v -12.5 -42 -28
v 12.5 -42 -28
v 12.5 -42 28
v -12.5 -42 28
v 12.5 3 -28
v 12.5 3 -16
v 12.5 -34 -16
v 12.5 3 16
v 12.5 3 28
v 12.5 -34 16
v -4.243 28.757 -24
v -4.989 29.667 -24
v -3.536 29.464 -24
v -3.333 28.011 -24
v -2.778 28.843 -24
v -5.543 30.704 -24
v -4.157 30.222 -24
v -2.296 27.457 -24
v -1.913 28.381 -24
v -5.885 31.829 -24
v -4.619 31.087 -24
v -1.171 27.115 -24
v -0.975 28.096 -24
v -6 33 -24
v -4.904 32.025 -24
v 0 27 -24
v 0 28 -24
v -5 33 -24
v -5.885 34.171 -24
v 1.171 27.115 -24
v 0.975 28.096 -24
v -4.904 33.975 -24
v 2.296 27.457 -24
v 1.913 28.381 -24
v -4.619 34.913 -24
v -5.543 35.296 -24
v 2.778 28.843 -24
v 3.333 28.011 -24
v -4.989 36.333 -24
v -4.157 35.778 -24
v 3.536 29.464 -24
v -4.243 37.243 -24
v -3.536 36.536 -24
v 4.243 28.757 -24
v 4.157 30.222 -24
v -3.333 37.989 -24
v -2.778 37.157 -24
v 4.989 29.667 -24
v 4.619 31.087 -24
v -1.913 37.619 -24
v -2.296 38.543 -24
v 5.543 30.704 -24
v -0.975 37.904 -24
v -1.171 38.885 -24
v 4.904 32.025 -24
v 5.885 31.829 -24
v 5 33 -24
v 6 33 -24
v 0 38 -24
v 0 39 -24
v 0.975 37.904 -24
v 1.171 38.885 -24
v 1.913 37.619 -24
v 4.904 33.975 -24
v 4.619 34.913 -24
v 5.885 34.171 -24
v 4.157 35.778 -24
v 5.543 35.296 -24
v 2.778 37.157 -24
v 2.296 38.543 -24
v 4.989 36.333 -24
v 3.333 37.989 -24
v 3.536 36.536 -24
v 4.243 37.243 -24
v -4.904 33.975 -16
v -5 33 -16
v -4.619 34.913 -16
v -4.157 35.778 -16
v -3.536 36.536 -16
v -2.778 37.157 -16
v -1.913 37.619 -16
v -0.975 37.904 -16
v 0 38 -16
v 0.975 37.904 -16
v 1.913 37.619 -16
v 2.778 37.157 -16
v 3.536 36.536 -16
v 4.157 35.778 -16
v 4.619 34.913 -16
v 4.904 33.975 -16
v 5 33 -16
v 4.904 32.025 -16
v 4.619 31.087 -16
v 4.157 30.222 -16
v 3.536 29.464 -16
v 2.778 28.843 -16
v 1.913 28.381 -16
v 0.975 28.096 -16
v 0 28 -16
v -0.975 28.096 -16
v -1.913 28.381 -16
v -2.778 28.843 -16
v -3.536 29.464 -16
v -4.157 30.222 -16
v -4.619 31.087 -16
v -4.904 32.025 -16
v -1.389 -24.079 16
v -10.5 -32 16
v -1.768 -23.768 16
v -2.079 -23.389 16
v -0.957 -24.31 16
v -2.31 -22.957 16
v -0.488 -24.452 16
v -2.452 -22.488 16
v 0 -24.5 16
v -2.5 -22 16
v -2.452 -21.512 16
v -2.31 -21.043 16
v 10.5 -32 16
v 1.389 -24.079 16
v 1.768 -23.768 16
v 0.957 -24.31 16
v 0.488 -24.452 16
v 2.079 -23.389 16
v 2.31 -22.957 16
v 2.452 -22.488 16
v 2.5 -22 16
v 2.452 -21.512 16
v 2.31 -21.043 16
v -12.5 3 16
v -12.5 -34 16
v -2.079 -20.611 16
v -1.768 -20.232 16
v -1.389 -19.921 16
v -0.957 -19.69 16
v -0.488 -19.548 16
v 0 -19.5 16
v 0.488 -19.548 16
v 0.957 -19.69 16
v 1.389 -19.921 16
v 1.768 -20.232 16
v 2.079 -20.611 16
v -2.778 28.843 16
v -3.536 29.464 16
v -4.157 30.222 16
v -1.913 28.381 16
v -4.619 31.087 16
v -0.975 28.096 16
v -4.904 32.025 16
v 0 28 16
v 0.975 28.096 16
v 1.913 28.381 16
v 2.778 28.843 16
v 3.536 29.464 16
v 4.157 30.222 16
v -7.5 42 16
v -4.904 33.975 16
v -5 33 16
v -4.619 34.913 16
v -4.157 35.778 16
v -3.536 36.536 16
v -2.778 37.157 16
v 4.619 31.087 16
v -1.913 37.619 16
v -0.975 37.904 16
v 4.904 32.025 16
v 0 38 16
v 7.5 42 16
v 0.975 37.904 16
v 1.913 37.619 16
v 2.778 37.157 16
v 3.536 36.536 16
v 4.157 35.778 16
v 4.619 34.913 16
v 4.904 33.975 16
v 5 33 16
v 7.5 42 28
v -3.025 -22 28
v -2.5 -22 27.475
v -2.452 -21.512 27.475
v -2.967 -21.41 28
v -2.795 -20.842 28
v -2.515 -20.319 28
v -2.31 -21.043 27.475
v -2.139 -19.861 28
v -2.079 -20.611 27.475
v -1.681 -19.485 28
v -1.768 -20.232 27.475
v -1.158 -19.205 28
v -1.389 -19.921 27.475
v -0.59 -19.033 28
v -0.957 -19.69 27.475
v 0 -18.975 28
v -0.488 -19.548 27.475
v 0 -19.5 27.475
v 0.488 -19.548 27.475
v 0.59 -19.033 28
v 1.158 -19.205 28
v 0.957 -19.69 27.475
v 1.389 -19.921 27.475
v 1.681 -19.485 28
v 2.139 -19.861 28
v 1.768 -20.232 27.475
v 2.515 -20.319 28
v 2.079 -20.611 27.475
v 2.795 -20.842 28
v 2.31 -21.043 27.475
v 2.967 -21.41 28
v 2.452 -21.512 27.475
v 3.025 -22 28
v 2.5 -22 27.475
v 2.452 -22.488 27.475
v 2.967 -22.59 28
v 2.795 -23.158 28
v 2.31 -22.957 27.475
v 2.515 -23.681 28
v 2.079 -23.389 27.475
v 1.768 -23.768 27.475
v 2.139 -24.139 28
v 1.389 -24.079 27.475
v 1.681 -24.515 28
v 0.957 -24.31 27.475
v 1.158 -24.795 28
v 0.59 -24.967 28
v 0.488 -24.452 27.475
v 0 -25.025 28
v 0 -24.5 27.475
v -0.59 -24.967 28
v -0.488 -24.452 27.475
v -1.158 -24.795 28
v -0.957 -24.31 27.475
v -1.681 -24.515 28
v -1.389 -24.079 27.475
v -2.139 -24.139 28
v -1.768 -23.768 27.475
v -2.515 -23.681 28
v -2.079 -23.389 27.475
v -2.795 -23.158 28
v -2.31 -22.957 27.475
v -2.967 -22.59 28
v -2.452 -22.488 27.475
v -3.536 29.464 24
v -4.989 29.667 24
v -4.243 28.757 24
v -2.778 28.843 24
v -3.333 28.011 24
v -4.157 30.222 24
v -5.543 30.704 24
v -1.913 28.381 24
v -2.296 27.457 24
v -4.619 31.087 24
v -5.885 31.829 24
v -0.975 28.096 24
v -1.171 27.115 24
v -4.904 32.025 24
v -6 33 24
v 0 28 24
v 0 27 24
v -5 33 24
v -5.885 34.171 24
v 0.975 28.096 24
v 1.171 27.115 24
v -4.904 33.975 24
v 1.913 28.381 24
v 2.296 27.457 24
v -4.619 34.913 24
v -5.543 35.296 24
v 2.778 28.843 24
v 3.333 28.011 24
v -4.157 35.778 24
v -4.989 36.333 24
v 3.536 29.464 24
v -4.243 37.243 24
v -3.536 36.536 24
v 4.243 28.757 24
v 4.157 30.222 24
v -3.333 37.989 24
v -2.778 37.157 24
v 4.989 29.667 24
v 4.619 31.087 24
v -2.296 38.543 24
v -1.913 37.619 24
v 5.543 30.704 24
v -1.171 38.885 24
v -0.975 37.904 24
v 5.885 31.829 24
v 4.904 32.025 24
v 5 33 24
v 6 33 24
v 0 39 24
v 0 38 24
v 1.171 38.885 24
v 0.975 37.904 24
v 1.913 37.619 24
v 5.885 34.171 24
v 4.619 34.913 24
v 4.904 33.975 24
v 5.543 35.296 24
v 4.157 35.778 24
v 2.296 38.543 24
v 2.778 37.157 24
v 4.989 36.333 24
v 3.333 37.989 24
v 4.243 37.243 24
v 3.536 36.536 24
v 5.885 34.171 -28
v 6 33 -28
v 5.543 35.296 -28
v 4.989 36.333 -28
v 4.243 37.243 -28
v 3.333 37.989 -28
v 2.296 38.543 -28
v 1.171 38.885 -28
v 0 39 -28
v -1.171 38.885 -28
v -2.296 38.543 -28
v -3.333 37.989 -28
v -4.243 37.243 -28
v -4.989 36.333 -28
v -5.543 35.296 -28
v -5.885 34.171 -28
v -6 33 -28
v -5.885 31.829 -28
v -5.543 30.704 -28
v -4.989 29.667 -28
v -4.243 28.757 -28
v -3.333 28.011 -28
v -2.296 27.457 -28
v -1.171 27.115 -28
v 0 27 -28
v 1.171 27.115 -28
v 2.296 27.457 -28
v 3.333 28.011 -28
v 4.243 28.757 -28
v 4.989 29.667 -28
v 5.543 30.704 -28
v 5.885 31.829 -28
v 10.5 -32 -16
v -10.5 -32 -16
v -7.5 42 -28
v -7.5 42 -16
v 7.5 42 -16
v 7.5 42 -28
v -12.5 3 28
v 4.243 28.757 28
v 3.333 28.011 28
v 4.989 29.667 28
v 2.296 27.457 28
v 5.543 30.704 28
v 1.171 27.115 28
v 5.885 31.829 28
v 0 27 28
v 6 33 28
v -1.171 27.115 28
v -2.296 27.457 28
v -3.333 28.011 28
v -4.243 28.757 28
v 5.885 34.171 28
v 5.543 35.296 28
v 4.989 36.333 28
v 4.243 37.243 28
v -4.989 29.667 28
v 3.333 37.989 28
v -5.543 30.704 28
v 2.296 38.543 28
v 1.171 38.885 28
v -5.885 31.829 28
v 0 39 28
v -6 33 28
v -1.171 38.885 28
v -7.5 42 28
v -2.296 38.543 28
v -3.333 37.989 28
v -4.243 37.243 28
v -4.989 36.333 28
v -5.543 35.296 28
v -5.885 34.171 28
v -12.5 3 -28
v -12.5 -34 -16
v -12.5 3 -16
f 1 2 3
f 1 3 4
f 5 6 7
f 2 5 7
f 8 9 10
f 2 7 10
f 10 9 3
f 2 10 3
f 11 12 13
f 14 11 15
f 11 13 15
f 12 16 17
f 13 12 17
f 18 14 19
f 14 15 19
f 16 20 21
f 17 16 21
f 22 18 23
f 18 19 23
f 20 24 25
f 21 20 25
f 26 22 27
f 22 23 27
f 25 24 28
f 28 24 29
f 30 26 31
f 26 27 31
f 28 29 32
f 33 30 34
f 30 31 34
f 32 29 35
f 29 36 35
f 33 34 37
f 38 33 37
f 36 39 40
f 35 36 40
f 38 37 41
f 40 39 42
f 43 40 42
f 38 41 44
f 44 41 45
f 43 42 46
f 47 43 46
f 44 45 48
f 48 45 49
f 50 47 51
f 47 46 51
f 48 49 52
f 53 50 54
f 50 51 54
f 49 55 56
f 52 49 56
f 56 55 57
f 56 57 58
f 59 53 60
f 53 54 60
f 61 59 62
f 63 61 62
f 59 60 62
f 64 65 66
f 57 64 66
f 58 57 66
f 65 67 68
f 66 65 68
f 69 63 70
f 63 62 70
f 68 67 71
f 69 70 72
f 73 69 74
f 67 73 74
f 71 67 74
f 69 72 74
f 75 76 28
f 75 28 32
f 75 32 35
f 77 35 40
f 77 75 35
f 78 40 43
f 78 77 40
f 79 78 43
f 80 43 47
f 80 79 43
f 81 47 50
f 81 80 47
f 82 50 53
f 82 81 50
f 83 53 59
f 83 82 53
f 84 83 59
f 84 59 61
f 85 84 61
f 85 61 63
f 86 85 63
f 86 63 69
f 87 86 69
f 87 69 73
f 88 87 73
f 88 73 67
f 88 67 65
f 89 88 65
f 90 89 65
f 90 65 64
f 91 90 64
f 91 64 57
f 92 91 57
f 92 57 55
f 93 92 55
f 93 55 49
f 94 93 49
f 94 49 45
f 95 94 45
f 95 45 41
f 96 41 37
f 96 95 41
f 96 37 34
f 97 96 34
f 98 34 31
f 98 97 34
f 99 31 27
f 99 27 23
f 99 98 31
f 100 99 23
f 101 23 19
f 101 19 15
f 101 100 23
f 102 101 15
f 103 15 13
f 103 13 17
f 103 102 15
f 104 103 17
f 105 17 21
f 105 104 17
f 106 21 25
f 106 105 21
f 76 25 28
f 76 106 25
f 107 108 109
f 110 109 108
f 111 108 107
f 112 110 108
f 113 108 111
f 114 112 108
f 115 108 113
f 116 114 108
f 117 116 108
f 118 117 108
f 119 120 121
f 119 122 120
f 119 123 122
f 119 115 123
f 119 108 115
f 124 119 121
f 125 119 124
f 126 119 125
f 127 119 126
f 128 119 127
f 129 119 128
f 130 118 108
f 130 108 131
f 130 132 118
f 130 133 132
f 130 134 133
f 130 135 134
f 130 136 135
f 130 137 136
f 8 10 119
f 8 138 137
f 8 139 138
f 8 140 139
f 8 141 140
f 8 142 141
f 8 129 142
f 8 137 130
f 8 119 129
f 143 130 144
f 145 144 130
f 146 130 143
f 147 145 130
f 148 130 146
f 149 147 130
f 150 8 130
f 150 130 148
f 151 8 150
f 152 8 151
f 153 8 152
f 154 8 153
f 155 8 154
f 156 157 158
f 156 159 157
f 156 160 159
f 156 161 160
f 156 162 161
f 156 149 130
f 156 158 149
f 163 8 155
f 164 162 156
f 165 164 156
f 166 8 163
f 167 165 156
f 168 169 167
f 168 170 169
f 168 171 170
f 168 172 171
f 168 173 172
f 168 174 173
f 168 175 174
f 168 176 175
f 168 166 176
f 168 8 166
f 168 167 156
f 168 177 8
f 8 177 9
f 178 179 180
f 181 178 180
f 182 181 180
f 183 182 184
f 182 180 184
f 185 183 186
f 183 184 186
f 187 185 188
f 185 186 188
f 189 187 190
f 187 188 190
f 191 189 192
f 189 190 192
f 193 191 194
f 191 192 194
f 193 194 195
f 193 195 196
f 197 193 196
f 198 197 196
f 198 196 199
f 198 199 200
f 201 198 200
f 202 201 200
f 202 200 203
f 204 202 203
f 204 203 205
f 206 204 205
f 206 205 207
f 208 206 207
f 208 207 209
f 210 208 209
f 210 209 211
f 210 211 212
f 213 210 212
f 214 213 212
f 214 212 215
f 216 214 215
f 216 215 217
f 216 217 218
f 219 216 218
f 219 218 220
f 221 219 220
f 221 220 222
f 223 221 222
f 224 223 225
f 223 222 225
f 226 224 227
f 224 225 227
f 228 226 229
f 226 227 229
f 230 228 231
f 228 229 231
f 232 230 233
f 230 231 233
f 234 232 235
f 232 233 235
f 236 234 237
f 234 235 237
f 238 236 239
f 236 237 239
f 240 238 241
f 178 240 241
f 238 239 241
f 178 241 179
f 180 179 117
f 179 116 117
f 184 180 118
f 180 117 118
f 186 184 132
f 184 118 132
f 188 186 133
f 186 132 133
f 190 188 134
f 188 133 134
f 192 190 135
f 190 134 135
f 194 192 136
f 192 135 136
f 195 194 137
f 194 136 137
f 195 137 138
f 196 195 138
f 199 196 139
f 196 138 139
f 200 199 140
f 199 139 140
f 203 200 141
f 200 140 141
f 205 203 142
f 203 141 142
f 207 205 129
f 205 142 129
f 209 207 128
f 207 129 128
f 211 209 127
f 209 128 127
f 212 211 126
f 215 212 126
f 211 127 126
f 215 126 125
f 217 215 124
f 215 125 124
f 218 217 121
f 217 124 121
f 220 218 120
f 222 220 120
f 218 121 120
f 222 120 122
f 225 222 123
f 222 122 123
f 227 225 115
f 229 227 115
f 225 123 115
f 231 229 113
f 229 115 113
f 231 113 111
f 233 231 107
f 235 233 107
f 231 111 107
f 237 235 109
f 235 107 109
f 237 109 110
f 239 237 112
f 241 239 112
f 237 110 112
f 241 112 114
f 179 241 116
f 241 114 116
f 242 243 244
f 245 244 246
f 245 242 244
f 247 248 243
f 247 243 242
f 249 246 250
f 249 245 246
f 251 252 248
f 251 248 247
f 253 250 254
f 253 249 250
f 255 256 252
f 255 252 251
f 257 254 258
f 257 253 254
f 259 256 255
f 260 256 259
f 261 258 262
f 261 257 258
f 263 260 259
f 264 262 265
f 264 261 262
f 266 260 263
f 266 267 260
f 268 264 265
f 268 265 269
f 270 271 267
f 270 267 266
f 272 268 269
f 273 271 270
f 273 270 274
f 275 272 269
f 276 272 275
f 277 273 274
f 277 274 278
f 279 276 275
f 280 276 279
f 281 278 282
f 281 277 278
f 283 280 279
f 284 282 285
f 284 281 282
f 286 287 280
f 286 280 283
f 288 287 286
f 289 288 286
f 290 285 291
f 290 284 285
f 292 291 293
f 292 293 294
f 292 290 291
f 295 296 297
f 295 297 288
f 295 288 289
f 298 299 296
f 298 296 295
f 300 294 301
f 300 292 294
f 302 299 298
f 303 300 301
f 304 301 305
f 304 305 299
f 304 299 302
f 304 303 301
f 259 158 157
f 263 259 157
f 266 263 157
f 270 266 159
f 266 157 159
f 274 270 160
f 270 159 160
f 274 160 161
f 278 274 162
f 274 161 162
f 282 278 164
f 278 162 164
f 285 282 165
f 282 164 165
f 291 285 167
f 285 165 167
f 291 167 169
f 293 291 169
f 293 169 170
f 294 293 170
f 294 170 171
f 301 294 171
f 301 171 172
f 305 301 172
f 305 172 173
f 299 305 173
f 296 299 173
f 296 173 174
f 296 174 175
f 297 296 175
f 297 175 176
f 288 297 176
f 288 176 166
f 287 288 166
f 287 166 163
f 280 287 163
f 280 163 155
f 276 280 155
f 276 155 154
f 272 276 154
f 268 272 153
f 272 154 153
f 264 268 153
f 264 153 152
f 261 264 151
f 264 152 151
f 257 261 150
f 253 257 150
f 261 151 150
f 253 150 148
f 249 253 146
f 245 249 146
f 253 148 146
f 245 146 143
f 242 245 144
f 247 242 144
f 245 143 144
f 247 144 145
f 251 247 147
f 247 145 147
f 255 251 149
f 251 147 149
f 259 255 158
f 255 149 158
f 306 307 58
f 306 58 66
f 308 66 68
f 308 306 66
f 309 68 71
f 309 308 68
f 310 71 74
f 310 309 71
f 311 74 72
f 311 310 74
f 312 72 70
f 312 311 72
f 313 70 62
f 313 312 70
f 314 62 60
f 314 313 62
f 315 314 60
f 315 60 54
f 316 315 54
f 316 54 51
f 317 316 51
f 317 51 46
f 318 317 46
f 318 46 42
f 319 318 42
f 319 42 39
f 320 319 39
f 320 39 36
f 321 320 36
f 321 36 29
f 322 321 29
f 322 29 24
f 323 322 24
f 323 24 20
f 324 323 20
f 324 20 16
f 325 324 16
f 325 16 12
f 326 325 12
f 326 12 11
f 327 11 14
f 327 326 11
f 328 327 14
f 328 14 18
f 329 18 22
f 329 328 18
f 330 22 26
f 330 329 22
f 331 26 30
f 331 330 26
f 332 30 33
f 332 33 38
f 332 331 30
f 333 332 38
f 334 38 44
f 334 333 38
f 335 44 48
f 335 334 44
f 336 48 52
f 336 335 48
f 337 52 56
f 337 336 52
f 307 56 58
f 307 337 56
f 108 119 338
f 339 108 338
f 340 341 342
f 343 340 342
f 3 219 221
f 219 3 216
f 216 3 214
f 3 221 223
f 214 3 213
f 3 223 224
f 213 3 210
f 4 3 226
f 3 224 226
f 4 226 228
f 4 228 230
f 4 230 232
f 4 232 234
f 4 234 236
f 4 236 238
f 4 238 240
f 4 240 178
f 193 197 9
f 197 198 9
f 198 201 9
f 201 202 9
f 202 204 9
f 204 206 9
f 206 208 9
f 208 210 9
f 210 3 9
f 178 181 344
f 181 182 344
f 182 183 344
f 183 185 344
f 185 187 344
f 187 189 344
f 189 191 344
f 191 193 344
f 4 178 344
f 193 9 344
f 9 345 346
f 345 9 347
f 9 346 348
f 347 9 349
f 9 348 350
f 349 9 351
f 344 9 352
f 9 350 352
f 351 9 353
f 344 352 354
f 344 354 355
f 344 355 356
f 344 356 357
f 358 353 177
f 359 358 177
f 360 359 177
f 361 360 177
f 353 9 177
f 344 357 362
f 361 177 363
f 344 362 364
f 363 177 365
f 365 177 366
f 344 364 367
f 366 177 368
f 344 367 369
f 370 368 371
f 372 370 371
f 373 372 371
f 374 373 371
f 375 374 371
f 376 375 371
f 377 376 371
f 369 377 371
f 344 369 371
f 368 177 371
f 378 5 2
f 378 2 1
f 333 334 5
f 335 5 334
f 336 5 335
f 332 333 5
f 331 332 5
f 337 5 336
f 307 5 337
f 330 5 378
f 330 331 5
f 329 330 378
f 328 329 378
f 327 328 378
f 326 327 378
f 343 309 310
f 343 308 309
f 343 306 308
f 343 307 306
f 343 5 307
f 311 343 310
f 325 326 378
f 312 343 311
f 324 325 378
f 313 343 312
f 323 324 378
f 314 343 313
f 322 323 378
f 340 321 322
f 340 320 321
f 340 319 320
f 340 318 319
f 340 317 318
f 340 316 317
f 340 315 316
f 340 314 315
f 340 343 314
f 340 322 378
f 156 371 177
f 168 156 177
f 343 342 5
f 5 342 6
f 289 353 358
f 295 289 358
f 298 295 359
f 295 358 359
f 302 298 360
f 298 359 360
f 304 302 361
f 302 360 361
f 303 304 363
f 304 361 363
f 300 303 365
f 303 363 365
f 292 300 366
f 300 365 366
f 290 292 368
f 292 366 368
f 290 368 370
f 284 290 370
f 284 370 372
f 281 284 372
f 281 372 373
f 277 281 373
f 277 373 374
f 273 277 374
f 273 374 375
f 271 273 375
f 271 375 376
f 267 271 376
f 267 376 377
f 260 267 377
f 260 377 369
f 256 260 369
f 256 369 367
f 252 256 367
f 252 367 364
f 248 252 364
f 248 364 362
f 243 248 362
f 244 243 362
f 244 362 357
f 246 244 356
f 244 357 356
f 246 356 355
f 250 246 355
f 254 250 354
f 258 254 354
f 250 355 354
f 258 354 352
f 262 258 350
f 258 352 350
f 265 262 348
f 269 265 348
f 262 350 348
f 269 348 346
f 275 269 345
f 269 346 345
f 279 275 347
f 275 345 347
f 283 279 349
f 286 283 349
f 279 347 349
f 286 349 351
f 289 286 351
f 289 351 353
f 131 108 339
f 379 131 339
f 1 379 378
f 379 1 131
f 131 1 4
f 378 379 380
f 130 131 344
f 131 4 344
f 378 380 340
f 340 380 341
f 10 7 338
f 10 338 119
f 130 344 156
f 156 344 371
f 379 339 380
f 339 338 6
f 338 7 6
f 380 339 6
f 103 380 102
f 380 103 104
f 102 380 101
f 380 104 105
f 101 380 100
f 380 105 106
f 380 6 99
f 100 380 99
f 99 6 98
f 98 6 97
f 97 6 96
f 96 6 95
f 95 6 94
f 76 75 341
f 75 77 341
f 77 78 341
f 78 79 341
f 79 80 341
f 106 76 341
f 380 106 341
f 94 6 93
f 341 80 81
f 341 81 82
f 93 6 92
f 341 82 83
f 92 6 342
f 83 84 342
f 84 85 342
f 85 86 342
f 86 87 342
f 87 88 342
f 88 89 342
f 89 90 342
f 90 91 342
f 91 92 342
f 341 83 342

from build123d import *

# Parameters (mm, degrees)
BOSS_EXTRUDE1_DEPTH         = 28
SKETCH2_W                   = 32
SKETCH2_H                   = 74
CUT_EXTRUDE1_DEPTH          = 28
CHAMFER1_SIZE               = 2
HOLE1_D                     = 10
HOLE1_DEPTH                 = 12
HOLE1_CBORE_D               = 12
HOLE1_CBORE_DEPTH           = 4
M6_TAPPED_HOLE1_D           = 5
M6_TAPPED_HOLE1_DEPTH       = 27
M6_TAPPED_HOLE1_CSINK_D     = 6.05
M6_TAPPED_HOLE1_CSINK_ANGLE = 90
M6_TAPPED_HOLE1_TIP         = 1.502151548


with BuildPart() as part:
    # Sketch1 → Boss-Extrude1 (new, symmetric)
    with BuildSketch(Plane.XY):
        Polygon((-7.5, 42), (7.5, 42), (12.5, 3), (12.5, -42), (-12.5, -42), (-12.5, 3), align=None)
    extrude(amount=BOSS_EXTRUDE1_DEPTH, both=True)

    # Sketch2 → Cut-Extrude1 (cut, symmetric)
    with BuildSketch(Plane(origin=(0, 0, 0), x_dir=(0, 0, -1), z_dir=(1, 0, 0))):
        with Locations((0, 5)):
            Rectangle(SKETCH2_W, SKETCH2_H)
    extrude(amount=CUT_EXTRUDE1_DEPTH, both=True, mode=Mode.SUBTRACT)

    # Chamfer1
    chamfer1_edges = [part.edges().sort_by_distance(p)[0] for p in [
        (-12.5, -32, 0),
        (12.5, -32, 0),
    ]]
    chamfer(chamfer1_edges, length=CHAMFER1_SIZE)

    # Hole1
    with Locations(Plane.XY.offset(28)):
        with Locations((0, 33)):
            hole1 = CounterBoreHole(HOLE1_D / 2, HOLE1_CBORE_D / 2, HOLE1_CBORE_DEPTH, depth=HOLE1_DEPTH)

    # Mirror1: Hole1 across plane
    add(hole1.mirror(Plane.XY), mode=Mode.SUBTRACT)

    # M6 Tapped Hole1
    with Locations(Plane.XY.offset(28)):
        with Locations((0, -22)):
            CounterSinkHole(M6_TAPPED_HOLE1_D / 2, M6_TAPPED_HOLE1_CSINK_D / 2, depth=M6_TAPPED_HOLE1_DEPTH, counter_sink_angle=M6_TAPPED_HOLE1_CSINK_ANGLE)
            with Locations((0, 0, -(M6_TAPPED_HOLE1_DEPTH + M6_TAPPED_HOLE1_TIP / 2))):  # 118° drill point
                Cone(0, M6_TAPPED_HOLE1_D / 2, M6_TAPPED_HOLE1_TIP, mode=Mode.SUBTRACT)


solid = part.part
